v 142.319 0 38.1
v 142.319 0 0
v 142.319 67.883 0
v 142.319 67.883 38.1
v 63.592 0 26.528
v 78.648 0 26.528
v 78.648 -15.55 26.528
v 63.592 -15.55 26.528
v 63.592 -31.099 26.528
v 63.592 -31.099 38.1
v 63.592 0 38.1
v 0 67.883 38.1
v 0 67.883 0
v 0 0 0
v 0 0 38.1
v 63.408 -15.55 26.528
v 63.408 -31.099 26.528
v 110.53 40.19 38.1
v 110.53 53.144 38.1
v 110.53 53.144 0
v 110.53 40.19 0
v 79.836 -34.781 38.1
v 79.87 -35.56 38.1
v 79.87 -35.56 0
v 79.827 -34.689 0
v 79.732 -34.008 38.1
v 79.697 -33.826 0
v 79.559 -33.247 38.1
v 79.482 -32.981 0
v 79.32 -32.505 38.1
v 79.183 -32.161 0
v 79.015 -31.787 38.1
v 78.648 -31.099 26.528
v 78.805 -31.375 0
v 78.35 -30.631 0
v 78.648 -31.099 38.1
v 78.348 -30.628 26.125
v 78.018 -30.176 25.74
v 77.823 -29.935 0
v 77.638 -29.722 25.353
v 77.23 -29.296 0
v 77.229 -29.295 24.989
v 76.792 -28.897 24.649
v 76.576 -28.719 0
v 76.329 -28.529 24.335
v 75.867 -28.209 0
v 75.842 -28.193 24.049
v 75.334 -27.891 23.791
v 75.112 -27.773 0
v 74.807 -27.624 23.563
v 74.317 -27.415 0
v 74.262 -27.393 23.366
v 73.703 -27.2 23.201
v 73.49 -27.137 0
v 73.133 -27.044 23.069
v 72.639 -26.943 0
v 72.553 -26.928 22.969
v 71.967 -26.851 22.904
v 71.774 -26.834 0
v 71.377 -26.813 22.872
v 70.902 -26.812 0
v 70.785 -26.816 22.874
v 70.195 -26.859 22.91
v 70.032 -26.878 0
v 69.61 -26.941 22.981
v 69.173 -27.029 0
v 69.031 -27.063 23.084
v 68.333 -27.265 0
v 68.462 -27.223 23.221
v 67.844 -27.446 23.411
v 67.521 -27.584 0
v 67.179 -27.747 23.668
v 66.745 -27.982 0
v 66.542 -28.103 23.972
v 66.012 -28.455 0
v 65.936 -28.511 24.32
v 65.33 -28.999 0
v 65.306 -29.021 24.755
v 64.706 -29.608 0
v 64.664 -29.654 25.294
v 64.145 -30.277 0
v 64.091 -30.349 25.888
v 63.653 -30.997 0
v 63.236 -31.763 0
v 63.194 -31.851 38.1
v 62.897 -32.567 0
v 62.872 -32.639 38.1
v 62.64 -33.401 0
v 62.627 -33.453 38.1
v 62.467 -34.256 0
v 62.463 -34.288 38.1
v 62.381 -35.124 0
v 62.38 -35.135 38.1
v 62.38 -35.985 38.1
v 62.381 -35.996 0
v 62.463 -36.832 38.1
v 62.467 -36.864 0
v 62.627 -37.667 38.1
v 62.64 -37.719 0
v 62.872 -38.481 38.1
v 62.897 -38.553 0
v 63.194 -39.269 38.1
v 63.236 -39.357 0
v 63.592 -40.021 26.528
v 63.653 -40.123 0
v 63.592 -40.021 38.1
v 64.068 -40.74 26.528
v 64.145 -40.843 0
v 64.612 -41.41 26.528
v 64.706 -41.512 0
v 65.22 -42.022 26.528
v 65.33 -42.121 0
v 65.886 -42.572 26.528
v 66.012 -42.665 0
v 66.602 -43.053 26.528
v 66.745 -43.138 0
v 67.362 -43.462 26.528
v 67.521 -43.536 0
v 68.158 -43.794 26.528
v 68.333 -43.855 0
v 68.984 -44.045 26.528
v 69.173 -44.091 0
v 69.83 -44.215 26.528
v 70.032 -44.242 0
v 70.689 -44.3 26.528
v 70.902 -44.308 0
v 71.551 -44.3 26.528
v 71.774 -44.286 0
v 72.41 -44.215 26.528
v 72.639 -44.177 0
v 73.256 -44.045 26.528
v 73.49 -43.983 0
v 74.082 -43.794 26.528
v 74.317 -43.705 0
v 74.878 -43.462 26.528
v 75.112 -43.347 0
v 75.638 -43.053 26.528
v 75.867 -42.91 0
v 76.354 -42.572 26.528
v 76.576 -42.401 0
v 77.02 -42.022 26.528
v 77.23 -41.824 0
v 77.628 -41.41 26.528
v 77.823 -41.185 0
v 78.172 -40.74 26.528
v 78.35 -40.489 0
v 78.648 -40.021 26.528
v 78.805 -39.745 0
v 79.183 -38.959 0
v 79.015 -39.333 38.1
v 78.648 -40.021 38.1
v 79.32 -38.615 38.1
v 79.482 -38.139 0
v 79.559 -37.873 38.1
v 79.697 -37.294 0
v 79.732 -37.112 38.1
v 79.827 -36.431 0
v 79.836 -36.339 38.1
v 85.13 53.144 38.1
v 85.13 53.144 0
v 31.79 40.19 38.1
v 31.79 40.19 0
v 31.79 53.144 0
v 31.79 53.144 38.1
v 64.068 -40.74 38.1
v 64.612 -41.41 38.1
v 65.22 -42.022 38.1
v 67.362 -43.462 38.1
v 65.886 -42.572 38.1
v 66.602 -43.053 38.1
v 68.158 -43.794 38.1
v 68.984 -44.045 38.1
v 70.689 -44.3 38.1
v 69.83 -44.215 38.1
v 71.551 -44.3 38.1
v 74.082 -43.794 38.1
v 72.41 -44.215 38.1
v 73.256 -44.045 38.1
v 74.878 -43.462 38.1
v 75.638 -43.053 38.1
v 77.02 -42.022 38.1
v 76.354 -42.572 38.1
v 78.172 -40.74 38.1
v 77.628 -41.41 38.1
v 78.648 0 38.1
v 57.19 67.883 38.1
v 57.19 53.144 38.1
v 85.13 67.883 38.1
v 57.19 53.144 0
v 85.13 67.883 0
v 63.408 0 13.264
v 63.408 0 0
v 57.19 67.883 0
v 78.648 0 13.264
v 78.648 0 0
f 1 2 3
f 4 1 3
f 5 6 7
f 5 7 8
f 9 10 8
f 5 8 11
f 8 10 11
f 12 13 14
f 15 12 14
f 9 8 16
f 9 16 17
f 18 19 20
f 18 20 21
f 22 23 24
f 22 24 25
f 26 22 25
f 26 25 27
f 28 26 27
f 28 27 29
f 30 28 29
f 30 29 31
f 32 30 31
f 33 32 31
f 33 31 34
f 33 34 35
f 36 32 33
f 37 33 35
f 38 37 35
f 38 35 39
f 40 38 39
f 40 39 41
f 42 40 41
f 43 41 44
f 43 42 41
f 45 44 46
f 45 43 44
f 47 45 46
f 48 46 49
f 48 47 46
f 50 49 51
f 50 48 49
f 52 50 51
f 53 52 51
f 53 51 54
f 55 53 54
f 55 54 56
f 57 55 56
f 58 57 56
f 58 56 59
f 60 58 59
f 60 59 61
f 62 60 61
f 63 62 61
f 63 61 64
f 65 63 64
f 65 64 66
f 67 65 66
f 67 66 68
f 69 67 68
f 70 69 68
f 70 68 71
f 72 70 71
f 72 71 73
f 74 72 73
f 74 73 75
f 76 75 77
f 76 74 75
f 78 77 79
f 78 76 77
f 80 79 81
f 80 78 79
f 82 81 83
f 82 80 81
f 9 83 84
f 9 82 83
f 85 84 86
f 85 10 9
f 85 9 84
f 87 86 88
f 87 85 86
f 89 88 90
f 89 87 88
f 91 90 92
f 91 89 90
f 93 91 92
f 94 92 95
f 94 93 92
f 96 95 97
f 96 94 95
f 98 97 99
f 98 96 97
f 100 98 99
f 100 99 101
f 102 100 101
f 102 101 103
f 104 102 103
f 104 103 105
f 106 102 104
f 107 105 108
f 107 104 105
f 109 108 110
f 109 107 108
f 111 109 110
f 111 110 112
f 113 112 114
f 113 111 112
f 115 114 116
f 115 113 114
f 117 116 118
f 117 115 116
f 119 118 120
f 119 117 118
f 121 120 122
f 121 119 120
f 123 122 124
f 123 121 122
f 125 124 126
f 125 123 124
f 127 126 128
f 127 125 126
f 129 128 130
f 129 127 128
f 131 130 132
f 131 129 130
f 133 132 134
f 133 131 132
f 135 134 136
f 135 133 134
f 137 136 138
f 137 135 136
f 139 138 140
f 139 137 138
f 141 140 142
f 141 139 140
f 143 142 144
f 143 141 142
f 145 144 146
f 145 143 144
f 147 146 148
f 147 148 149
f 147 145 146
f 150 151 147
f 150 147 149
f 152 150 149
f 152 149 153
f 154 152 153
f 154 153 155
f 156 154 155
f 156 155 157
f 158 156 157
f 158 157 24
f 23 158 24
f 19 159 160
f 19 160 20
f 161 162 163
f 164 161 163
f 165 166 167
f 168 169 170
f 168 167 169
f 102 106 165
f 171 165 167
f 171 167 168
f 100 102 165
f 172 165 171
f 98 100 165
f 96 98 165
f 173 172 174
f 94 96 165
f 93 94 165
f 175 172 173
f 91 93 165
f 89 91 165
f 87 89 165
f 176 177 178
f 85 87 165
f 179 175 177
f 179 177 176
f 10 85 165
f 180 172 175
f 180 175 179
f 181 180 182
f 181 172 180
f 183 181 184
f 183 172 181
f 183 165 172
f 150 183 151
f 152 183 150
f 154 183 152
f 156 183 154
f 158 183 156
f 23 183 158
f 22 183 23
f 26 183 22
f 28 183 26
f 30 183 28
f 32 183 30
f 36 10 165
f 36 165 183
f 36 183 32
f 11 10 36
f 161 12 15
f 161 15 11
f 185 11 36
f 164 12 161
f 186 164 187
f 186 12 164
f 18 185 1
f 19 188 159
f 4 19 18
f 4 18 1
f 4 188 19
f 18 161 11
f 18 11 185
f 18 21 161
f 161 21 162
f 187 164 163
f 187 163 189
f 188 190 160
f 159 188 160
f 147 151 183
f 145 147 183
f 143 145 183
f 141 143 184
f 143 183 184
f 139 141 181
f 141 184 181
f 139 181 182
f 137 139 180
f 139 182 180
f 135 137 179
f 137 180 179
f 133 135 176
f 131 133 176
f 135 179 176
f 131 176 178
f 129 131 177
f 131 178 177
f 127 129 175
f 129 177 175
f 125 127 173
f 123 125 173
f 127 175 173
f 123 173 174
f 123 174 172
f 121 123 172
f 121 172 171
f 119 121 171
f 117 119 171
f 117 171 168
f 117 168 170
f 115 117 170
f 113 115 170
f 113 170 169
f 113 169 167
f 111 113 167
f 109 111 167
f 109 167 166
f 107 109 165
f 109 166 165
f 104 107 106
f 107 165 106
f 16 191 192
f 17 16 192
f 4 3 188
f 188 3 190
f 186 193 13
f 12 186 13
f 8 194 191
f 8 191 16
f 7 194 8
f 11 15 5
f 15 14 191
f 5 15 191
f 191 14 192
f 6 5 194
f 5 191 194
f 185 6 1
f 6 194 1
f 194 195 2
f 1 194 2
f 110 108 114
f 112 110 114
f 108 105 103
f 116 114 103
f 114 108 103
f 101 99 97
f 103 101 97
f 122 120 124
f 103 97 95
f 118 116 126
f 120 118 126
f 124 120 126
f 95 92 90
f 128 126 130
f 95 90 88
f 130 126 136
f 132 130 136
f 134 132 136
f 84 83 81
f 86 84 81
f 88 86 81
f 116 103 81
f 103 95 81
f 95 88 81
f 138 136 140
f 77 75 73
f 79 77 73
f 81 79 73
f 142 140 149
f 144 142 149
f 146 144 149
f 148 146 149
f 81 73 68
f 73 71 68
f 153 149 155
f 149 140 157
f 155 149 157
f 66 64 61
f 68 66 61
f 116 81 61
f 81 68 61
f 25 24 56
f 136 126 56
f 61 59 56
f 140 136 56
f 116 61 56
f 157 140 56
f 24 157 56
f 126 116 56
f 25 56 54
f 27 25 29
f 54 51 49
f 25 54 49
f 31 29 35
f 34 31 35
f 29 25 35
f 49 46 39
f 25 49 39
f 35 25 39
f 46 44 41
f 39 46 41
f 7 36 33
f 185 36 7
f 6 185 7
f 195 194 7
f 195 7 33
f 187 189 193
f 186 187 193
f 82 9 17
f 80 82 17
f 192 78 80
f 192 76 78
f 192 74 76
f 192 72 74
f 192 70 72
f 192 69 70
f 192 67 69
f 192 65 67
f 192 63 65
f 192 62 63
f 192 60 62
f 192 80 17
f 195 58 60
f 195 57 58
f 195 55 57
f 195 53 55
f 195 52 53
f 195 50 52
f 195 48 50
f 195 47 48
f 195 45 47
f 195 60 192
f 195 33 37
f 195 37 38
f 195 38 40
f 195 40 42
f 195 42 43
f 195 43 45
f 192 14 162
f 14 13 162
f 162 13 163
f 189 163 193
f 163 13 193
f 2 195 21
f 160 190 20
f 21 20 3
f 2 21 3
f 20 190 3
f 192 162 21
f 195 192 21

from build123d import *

# Parameters (mm, degrees)
BOSS_EXTRUDE1_DEPTH = 38.1
SKETCH2_R           = 8.7503
BOSS_EXTRUDE2_DEPTH = 38.1
BOSS_EXTRUDE6_DEPTH = 11.572281197
BOSS_EXTRUDE9_DEPTH = 15.24


with BuildPart() as part:
    # Sketch1 → Boss-Extrude1 (new body)
    with BuildSketch(Plane.XY):
        Polygon((0, 0), (142.319474343, 0), (142.319474343, 67.883016851), (85.129737171, 67.883016851), (85.129737171, 53.144138708), (110.529737171, 53.144138708), (110.529737171, 40.190138708), (31.789737171, 40.190138708), (31.789737171, 53.144138708), (57.189737171, 53.144138708), (57.189737171, 67.883016851), (0, 67.883016851), align=None)
    extrude(amount=BOSS_EXTRUDE1_DEPTH)



with BuildPart() as body_2:
    # Sketch2 → Boss-Extrude2 (new body)
    with BuildSketch(Plane.XY.offset(38.1)):
        with Locations((71.120000025, -35.559977798)):
            Circle(SKETCH2_R)
    extrude(amount=-BOSS_EXTRUDE2_DEPTH)


with BuildPart() as part_1:
    add(part.part)

    add(body_2.part)  # Boss-Extrude6 merges body 2
    # Sketch8 → Boss-Extrude6 (add)
    with BuildSketch(Plane.XY.offset(38.1)):
        with BuildLine():
            Line((63.59200581, -40.020589099), (63.59200581, 0))
            Line((63.59200581, 0), (78.647994227, 0))
            Line((78.647994227, 0), (78.647994227, -40.020589121))
            ThreePointArc((78.647994227, -40.020589121), (71.120000012, -44.310277798), (63.59200581, -40.020589099))
        make_face()
    extrude(amount=-BOSS_EXTRUDE6_DEPTH)

    # Sketch11 → Boss-Extrude9 (add)
    with BuildSketch(Plane(origin=(78.647994227, 0, 0), x_dir=(0, 0, -1), z_dir=(1, 0, 0))):
        Polygon((-26.527718803, -31.099366474), (0, 0), (-13.263859401, 0), (-26.527718803, -15.549683237), align=None)
    extrude(amount=-BOSS_EXTRUDE9_DEPTH)


solid = part_1.part
